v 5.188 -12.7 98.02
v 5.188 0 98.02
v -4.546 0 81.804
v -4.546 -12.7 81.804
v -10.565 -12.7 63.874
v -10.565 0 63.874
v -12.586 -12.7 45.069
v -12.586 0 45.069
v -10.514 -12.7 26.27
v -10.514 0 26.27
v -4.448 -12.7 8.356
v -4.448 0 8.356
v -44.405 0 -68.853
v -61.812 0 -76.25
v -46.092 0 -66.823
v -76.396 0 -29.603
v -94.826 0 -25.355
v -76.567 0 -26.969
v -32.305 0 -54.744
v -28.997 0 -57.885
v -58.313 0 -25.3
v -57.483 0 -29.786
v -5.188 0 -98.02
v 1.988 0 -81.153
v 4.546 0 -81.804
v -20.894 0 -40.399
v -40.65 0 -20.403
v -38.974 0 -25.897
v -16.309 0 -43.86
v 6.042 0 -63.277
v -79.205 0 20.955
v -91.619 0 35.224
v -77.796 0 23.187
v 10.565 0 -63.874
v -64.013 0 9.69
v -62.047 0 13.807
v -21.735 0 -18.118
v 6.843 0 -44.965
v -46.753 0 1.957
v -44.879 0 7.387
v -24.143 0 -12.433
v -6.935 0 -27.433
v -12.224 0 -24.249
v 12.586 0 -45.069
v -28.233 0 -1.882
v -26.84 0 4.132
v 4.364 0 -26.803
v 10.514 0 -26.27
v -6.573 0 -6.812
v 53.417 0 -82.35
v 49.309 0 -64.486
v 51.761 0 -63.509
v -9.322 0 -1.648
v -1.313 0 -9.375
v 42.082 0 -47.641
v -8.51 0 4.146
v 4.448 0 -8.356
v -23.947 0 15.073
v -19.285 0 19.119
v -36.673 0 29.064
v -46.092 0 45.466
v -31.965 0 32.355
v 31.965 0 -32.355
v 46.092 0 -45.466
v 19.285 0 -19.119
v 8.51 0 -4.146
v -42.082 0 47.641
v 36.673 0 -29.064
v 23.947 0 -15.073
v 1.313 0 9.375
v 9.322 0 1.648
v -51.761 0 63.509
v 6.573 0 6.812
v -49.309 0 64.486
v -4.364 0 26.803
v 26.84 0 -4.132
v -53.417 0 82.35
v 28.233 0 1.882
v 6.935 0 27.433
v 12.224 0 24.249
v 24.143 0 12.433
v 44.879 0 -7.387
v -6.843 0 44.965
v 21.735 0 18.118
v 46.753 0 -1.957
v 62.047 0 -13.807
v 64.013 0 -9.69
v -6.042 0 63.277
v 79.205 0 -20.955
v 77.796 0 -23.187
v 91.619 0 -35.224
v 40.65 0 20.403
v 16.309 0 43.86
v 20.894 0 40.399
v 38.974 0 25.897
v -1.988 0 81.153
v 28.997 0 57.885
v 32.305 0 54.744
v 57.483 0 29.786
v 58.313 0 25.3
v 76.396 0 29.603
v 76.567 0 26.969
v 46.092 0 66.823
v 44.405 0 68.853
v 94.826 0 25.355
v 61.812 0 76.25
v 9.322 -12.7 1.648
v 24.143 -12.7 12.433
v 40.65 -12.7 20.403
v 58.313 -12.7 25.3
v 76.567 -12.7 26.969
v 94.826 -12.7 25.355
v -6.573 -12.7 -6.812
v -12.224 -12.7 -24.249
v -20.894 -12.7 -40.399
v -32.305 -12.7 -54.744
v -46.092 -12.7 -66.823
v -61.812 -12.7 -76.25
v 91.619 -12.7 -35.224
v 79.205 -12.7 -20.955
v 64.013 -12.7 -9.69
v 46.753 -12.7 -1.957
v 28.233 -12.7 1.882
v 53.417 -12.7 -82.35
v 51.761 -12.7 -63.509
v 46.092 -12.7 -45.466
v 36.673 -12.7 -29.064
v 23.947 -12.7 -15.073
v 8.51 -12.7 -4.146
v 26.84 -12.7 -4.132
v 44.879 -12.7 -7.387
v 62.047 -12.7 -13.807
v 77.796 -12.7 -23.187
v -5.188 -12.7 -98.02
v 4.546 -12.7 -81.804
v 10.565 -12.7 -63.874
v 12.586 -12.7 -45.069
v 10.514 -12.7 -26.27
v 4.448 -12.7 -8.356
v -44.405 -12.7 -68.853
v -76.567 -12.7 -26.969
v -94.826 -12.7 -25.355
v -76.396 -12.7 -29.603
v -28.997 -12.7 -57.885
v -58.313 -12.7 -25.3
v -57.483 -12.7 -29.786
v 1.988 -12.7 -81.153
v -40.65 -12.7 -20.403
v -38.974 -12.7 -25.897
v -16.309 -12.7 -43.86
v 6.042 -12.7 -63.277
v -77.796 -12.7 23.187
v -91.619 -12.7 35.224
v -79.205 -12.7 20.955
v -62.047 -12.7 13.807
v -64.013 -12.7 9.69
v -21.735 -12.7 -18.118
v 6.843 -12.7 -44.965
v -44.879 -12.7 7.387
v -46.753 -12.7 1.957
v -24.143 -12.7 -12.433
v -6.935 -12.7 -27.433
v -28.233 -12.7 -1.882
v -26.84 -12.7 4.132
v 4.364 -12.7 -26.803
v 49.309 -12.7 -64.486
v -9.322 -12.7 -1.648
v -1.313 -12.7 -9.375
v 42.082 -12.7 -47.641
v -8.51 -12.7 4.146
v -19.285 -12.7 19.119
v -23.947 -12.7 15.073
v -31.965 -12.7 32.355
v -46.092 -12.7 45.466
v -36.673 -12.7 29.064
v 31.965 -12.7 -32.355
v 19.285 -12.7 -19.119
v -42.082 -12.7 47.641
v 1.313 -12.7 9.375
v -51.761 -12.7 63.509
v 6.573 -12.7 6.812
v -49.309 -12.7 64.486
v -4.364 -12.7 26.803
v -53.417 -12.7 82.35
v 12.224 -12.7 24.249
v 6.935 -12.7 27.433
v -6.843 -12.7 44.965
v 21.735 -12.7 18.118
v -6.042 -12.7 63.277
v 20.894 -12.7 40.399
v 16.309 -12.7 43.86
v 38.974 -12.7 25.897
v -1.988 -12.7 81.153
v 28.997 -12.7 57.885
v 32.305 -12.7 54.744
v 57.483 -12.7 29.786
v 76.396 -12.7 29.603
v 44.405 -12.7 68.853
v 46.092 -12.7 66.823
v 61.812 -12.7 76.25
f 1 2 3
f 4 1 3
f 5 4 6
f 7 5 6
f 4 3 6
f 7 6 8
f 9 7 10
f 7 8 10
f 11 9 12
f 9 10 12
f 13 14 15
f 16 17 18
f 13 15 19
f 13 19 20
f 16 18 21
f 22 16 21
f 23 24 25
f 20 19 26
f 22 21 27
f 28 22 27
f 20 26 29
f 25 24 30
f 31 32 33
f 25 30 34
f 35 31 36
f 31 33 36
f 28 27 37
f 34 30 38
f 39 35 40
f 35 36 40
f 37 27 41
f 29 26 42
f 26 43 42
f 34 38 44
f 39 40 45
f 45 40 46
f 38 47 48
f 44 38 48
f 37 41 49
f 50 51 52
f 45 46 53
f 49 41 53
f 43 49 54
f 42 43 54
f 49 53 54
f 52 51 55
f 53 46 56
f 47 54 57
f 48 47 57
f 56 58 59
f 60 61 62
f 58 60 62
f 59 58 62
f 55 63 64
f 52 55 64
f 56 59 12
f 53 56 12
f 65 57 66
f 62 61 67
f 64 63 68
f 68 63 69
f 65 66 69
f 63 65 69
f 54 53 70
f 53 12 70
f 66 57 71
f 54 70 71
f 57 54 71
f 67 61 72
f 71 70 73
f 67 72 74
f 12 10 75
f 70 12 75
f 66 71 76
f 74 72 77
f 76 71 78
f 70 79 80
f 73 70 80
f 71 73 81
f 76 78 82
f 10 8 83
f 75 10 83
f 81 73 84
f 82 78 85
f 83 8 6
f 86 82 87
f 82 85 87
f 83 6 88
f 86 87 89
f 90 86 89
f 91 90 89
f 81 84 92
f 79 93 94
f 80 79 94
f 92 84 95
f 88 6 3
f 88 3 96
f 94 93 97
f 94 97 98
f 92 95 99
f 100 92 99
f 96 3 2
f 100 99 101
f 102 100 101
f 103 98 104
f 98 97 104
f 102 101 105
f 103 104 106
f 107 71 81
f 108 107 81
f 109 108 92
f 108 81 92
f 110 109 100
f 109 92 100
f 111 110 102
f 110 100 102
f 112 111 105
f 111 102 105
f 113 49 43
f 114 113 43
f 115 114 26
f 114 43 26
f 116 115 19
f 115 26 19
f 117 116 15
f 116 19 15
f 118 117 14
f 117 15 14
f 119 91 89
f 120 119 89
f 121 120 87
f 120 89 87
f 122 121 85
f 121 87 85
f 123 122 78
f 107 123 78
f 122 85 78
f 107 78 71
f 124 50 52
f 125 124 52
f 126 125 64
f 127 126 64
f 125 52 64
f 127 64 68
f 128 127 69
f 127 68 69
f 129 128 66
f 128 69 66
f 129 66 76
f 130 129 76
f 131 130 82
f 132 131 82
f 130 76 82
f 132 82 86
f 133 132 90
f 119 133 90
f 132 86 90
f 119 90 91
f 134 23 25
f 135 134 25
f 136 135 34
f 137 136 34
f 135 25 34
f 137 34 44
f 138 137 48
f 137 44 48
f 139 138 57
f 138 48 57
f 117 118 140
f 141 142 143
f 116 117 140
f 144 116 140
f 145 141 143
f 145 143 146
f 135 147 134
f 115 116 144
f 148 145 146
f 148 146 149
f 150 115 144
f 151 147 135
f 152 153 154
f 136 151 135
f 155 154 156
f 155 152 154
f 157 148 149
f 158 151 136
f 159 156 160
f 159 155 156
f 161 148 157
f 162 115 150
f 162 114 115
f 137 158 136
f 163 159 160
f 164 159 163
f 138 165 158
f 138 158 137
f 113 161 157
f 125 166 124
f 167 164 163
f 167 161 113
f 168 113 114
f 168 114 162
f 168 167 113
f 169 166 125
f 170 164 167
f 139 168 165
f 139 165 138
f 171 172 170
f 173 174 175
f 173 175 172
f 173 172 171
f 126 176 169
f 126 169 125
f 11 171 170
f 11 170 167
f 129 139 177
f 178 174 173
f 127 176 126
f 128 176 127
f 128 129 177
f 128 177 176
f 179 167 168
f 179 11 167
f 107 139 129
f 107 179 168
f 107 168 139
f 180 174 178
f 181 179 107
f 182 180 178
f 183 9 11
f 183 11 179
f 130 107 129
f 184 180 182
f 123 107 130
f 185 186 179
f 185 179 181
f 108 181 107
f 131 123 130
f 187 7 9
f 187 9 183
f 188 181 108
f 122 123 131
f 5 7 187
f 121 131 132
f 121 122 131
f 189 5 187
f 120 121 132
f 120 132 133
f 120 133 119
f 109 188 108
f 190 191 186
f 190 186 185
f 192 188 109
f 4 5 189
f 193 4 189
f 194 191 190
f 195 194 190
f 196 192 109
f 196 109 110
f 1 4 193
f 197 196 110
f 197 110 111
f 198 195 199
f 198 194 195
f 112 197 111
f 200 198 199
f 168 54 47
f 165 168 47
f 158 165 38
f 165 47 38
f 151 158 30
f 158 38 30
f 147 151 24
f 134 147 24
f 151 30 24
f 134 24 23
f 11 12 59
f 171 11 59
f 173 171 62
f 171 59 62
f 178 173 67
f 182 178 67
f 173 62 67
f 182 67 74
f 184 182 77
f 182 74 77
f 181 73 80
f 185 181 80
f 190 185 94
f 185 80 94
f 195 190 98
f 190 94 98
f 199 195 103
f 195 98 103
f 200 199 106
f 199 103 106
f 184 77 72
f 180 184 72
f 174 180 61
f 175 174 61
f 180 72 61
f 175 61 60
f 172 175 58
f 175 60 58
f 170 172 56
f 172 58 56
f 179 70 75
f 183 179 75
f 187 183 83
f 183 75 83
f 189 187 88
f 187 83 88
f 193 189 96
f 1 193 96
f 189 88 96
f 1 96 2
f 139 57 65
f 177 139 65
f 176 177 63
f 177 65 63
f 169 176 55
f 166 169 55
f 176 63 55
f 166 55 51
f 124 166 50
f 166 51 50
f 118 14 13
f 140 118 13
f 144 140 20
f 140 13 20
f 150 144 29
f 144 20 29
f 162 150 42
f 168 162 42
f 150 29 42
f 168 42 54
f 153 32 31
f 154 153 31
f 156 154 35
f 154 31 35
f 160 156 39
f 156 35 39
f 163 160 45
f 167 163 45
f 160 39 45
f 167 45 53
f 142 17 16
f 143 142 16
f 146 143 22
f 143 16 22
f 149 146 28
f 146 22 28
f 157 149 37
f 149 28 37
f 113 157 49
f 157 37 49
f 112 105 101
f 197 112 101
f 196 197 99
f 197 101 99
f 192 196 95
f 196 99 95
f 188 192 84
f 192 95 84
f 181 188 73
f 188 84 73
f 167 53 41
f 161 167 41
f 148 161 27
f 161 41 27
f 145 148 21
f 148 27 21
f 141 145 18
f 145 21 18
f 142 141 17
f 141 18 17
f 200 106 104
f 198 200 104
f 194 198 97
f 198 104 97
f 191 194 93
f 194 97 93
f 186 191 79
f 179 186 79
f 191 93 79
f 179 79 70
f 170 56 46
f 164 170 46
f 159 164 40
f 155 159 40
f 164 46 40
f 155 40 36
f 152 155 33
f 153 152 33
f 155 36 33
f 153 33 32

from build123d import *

# Parameters (mm, degrees)
F1_DEPTH = 12.7


with BuildPart() as f1:
    # F0 (on Front) → F1 (new body)
    with BuildSketch(Plane.XZ):
        with BuildLine():
            ThreePointArc((6.572816, 6.812144), (26.277771, 47.8275), (61.812241, 76.250136))
            ThreePointArc((61.812241, 76.250136), (22.272642, 51.216691), (1.313443, 9.374544))
            ThreePointArc((1.313443, 9.374544), (-6.853136, 54.138947), (5.188448, 98.019979))
            ThreePointArc((5.188448, 98.019979), (-12.08547, 54.526704), (-4.447622, 8.356188))
            ThreePointArc((-4.447622, 8.356188), (-37.366378, 39.771156), (-53.417156, 82.349522))
            ThreePointArc((-53.417156, 82.349522), (-41.827343, 37.009369), (-8.509846, 4.146052))
            ThreePointArc((-8.509846, 4.146052), (-53.606934, 10.212135), (-91.619221, 35.224346))
            ThreePointArc((-91.619221, 35.224346), (-55.592593, 5.355713), (-9.321598, -1.647735))
            ThreePointArc((-9.321598, -1.647735), (-49.371463, -23.247574), (-94.825858, -25.355332))
            ThreePointArc((-94.825858, -25.355332), (-48.123361, -28.343643), (-6.572816, -6.812144))
            ThreePointArc((-6.572816, -6.812144), (-26.277771, -47.8275), (-61.812241, -76.250136))
            ThreePointArc((-61.812241, -76.250136), (-22.272642, -51.216691), (-1.313443, -9.374544))
            ThreePointArc((-1.313443, -9.374544), (6.853136, -54.138947), (-5.188448, -98.019979))
            ThreePointArc((-5.188448, -98.019979), (12.08547, -54.526704), (4.447622, -8.356188))
            ThreePointArc((4.447622, -8.356188), (37.366378, -39.771156), (53.417156, -82.349522))
            ThreePointArc((53.417156, -82.349522), (41.827343, -37.009369), (8.509846, -4.146052))
            ThreePointArc((8.509846, -4.146052), (53.606934, -10.212135), (91.619221, -35.224346))
            ThreePointArc((91.619221, -35.224346), (55.592593, -5.355713), (9.321598, 1.647735))
            ThreePointArc((9.321598, 1.647735), (49.371463, 23.247574), (94.825858, 25.355332))
            ThreePointArc((94.825858, 25.355332), (48.123361, 28.343643), (6.572816, 6.812144))
        make_face()
        Polygon((-4.938063, -1.002567), (-5.263817, 0), (-4.584271, 2.091427), (-4.258517, 3.093994), (-2.479443, 4.386567), (-1.626609, 5.006187), (0.572448, 5.006187), (1.626609, 5.006187), (3.405683, 3.713614), (4.258517, 3.093994), (4.938063, 1.002567), (5.263817, 0), (4.584271, -2.091427), (4.258517, -3.093994), (2.479443, -4.386567), (1.626609, -5.006187), (-0.572448, -5.006187), (-1.626609, -5.006187), (-3.405683, -3.713614), (-4.258517, -3.093994), align=None, mode=Mode.SUBTRACT)
        with BuildLine():
            ThreePointArc((-0.572448, -5.006187), (-0.250143, -2.507219), (0, 0))
            ThreePointArc((0, 0), (-1.676076, -1.881353), (-3.405683, -3.713614))
            Line((-3.405683, -3.713614), (-1.626609, -5.006187))
            Line((-1.626609, -5.006187), (-0.572448, -5.006187))
        make_face()
        with BuildLine():
            ThreePointArc((0, 0), (-2.461806, -0.536873), (-4.938063, -1.002567))
            Line((-4.938063, -1.002567), (-4.258517, -3.093994))
            Line((-4.258517, -3.093994), (-3.405683, -3.713614))
            ThreePointArc((-3.405683, -3.713614), (-1.676076, -1.881353), (0, 0))
        make_face()
        with BuildLine():
            Line((-4.584271, 2.091427), (-5.263817, 0))
            Line((-5.263817, 0), (-4.938063, -1.002567))
            ThreePointArc((-4.938063, -1.002567), (-2.461806, -0.536873), (0, 0))
            ThreePointArc((0, 0), (-2.307209, 1.012673), (-4.584271, 2.091427))
        make_face()
        with BuildLine():
            Line((-4.258517, 3.093994), (-4.584271, 2.091427))
            ThreePointArc((-4.584271, 2.091427), (-2.307209, 1.012673), (0, 0))
            ThreePointArc((0, 0), (-1.271337, 2.175413), (-2.479443, 4.386567))
            Line((-2.479443, 4.386567), (-4.258517, 3.093994))
        make_face()
        with BuildLine():
            ThreePointArc((-2.479443, 4.386567), (-1.271337, 2.175413), (0, 0))
            ThreePointArc((0, 0), (0.250143, 2.507219), (0.572448, 5.006187))
            Line((0.572448, 5.006187), (-1.626609, 5.006187))
            Line((-1.626609, 5.006187), (-2.479443, 4.386567))
        make_face()
        with BuildLine():
            ThreePointArc((0.572448, 5.006187), (0.250143, 2.507219), (0, 0))
            ThreePointArc((0, 0), (1.676076, 1.881353), (3.405683, 3.713614))
            Line((3.405683, 3.713614), (1.626609, 5.006187))
            Line((1.626609, 5.006187), (0.572448, 5.006187))
        make_face()
        with BuildLine():
            ThreePointArc((3.405683, 3.713614), (1.676076, 1.881353), (0, 0))
            ThreePointArc((0, 0), (2.461806, 0.536873), (4.938063, 1.002567))
            Line((4.938063, 1.002567), (4.258517, 3.093994))
            Line((4.258517, 3.093994), (3.405683, 3.713614))
        make_face()
        with BuildLine():
            ThreePointArc((4.938063, 1.002567), (2.461806, 0.536873), (0, 0))
            ThreePointArc((0, 0), (2.307209, -1.012673), (4.584271, -2.091427))
            Line((4.584271, -2.091427), (5.263817, 0))
            Line((5.263817, 0), (4.938063, 1.002567))
        make_face()
        with BuildLine():
            ThreePointArc((4.584271, -2.091427), (2.307209, -1.012673), (0, 0))
            ThreePointArc((0, 0), (1.271337, -2.175413), (2.479443, -4.386567))
            Line((2.479443, -4.386567), (4.258517, -3.093994))
            Line((4.258517, -3.093994), (4.584271, -2.091427))
        make_face()
        with BuildLine():
            ThreePointArc((2.479443, -4.386567), (1.271337, -2.175413), (0, 0))
            ThreePointArc((0, 0), (-0.250143, -2.507219), (-0.572448, -5.006187))
            Line((-0.572448, -5.006187), (1.626609, -5.006187))
            Line((1.626609, -5.006187), (2.479443, -4.386567))
        make_face()
    extrude(amount=F1_DEPTH)


solid = f1.part
